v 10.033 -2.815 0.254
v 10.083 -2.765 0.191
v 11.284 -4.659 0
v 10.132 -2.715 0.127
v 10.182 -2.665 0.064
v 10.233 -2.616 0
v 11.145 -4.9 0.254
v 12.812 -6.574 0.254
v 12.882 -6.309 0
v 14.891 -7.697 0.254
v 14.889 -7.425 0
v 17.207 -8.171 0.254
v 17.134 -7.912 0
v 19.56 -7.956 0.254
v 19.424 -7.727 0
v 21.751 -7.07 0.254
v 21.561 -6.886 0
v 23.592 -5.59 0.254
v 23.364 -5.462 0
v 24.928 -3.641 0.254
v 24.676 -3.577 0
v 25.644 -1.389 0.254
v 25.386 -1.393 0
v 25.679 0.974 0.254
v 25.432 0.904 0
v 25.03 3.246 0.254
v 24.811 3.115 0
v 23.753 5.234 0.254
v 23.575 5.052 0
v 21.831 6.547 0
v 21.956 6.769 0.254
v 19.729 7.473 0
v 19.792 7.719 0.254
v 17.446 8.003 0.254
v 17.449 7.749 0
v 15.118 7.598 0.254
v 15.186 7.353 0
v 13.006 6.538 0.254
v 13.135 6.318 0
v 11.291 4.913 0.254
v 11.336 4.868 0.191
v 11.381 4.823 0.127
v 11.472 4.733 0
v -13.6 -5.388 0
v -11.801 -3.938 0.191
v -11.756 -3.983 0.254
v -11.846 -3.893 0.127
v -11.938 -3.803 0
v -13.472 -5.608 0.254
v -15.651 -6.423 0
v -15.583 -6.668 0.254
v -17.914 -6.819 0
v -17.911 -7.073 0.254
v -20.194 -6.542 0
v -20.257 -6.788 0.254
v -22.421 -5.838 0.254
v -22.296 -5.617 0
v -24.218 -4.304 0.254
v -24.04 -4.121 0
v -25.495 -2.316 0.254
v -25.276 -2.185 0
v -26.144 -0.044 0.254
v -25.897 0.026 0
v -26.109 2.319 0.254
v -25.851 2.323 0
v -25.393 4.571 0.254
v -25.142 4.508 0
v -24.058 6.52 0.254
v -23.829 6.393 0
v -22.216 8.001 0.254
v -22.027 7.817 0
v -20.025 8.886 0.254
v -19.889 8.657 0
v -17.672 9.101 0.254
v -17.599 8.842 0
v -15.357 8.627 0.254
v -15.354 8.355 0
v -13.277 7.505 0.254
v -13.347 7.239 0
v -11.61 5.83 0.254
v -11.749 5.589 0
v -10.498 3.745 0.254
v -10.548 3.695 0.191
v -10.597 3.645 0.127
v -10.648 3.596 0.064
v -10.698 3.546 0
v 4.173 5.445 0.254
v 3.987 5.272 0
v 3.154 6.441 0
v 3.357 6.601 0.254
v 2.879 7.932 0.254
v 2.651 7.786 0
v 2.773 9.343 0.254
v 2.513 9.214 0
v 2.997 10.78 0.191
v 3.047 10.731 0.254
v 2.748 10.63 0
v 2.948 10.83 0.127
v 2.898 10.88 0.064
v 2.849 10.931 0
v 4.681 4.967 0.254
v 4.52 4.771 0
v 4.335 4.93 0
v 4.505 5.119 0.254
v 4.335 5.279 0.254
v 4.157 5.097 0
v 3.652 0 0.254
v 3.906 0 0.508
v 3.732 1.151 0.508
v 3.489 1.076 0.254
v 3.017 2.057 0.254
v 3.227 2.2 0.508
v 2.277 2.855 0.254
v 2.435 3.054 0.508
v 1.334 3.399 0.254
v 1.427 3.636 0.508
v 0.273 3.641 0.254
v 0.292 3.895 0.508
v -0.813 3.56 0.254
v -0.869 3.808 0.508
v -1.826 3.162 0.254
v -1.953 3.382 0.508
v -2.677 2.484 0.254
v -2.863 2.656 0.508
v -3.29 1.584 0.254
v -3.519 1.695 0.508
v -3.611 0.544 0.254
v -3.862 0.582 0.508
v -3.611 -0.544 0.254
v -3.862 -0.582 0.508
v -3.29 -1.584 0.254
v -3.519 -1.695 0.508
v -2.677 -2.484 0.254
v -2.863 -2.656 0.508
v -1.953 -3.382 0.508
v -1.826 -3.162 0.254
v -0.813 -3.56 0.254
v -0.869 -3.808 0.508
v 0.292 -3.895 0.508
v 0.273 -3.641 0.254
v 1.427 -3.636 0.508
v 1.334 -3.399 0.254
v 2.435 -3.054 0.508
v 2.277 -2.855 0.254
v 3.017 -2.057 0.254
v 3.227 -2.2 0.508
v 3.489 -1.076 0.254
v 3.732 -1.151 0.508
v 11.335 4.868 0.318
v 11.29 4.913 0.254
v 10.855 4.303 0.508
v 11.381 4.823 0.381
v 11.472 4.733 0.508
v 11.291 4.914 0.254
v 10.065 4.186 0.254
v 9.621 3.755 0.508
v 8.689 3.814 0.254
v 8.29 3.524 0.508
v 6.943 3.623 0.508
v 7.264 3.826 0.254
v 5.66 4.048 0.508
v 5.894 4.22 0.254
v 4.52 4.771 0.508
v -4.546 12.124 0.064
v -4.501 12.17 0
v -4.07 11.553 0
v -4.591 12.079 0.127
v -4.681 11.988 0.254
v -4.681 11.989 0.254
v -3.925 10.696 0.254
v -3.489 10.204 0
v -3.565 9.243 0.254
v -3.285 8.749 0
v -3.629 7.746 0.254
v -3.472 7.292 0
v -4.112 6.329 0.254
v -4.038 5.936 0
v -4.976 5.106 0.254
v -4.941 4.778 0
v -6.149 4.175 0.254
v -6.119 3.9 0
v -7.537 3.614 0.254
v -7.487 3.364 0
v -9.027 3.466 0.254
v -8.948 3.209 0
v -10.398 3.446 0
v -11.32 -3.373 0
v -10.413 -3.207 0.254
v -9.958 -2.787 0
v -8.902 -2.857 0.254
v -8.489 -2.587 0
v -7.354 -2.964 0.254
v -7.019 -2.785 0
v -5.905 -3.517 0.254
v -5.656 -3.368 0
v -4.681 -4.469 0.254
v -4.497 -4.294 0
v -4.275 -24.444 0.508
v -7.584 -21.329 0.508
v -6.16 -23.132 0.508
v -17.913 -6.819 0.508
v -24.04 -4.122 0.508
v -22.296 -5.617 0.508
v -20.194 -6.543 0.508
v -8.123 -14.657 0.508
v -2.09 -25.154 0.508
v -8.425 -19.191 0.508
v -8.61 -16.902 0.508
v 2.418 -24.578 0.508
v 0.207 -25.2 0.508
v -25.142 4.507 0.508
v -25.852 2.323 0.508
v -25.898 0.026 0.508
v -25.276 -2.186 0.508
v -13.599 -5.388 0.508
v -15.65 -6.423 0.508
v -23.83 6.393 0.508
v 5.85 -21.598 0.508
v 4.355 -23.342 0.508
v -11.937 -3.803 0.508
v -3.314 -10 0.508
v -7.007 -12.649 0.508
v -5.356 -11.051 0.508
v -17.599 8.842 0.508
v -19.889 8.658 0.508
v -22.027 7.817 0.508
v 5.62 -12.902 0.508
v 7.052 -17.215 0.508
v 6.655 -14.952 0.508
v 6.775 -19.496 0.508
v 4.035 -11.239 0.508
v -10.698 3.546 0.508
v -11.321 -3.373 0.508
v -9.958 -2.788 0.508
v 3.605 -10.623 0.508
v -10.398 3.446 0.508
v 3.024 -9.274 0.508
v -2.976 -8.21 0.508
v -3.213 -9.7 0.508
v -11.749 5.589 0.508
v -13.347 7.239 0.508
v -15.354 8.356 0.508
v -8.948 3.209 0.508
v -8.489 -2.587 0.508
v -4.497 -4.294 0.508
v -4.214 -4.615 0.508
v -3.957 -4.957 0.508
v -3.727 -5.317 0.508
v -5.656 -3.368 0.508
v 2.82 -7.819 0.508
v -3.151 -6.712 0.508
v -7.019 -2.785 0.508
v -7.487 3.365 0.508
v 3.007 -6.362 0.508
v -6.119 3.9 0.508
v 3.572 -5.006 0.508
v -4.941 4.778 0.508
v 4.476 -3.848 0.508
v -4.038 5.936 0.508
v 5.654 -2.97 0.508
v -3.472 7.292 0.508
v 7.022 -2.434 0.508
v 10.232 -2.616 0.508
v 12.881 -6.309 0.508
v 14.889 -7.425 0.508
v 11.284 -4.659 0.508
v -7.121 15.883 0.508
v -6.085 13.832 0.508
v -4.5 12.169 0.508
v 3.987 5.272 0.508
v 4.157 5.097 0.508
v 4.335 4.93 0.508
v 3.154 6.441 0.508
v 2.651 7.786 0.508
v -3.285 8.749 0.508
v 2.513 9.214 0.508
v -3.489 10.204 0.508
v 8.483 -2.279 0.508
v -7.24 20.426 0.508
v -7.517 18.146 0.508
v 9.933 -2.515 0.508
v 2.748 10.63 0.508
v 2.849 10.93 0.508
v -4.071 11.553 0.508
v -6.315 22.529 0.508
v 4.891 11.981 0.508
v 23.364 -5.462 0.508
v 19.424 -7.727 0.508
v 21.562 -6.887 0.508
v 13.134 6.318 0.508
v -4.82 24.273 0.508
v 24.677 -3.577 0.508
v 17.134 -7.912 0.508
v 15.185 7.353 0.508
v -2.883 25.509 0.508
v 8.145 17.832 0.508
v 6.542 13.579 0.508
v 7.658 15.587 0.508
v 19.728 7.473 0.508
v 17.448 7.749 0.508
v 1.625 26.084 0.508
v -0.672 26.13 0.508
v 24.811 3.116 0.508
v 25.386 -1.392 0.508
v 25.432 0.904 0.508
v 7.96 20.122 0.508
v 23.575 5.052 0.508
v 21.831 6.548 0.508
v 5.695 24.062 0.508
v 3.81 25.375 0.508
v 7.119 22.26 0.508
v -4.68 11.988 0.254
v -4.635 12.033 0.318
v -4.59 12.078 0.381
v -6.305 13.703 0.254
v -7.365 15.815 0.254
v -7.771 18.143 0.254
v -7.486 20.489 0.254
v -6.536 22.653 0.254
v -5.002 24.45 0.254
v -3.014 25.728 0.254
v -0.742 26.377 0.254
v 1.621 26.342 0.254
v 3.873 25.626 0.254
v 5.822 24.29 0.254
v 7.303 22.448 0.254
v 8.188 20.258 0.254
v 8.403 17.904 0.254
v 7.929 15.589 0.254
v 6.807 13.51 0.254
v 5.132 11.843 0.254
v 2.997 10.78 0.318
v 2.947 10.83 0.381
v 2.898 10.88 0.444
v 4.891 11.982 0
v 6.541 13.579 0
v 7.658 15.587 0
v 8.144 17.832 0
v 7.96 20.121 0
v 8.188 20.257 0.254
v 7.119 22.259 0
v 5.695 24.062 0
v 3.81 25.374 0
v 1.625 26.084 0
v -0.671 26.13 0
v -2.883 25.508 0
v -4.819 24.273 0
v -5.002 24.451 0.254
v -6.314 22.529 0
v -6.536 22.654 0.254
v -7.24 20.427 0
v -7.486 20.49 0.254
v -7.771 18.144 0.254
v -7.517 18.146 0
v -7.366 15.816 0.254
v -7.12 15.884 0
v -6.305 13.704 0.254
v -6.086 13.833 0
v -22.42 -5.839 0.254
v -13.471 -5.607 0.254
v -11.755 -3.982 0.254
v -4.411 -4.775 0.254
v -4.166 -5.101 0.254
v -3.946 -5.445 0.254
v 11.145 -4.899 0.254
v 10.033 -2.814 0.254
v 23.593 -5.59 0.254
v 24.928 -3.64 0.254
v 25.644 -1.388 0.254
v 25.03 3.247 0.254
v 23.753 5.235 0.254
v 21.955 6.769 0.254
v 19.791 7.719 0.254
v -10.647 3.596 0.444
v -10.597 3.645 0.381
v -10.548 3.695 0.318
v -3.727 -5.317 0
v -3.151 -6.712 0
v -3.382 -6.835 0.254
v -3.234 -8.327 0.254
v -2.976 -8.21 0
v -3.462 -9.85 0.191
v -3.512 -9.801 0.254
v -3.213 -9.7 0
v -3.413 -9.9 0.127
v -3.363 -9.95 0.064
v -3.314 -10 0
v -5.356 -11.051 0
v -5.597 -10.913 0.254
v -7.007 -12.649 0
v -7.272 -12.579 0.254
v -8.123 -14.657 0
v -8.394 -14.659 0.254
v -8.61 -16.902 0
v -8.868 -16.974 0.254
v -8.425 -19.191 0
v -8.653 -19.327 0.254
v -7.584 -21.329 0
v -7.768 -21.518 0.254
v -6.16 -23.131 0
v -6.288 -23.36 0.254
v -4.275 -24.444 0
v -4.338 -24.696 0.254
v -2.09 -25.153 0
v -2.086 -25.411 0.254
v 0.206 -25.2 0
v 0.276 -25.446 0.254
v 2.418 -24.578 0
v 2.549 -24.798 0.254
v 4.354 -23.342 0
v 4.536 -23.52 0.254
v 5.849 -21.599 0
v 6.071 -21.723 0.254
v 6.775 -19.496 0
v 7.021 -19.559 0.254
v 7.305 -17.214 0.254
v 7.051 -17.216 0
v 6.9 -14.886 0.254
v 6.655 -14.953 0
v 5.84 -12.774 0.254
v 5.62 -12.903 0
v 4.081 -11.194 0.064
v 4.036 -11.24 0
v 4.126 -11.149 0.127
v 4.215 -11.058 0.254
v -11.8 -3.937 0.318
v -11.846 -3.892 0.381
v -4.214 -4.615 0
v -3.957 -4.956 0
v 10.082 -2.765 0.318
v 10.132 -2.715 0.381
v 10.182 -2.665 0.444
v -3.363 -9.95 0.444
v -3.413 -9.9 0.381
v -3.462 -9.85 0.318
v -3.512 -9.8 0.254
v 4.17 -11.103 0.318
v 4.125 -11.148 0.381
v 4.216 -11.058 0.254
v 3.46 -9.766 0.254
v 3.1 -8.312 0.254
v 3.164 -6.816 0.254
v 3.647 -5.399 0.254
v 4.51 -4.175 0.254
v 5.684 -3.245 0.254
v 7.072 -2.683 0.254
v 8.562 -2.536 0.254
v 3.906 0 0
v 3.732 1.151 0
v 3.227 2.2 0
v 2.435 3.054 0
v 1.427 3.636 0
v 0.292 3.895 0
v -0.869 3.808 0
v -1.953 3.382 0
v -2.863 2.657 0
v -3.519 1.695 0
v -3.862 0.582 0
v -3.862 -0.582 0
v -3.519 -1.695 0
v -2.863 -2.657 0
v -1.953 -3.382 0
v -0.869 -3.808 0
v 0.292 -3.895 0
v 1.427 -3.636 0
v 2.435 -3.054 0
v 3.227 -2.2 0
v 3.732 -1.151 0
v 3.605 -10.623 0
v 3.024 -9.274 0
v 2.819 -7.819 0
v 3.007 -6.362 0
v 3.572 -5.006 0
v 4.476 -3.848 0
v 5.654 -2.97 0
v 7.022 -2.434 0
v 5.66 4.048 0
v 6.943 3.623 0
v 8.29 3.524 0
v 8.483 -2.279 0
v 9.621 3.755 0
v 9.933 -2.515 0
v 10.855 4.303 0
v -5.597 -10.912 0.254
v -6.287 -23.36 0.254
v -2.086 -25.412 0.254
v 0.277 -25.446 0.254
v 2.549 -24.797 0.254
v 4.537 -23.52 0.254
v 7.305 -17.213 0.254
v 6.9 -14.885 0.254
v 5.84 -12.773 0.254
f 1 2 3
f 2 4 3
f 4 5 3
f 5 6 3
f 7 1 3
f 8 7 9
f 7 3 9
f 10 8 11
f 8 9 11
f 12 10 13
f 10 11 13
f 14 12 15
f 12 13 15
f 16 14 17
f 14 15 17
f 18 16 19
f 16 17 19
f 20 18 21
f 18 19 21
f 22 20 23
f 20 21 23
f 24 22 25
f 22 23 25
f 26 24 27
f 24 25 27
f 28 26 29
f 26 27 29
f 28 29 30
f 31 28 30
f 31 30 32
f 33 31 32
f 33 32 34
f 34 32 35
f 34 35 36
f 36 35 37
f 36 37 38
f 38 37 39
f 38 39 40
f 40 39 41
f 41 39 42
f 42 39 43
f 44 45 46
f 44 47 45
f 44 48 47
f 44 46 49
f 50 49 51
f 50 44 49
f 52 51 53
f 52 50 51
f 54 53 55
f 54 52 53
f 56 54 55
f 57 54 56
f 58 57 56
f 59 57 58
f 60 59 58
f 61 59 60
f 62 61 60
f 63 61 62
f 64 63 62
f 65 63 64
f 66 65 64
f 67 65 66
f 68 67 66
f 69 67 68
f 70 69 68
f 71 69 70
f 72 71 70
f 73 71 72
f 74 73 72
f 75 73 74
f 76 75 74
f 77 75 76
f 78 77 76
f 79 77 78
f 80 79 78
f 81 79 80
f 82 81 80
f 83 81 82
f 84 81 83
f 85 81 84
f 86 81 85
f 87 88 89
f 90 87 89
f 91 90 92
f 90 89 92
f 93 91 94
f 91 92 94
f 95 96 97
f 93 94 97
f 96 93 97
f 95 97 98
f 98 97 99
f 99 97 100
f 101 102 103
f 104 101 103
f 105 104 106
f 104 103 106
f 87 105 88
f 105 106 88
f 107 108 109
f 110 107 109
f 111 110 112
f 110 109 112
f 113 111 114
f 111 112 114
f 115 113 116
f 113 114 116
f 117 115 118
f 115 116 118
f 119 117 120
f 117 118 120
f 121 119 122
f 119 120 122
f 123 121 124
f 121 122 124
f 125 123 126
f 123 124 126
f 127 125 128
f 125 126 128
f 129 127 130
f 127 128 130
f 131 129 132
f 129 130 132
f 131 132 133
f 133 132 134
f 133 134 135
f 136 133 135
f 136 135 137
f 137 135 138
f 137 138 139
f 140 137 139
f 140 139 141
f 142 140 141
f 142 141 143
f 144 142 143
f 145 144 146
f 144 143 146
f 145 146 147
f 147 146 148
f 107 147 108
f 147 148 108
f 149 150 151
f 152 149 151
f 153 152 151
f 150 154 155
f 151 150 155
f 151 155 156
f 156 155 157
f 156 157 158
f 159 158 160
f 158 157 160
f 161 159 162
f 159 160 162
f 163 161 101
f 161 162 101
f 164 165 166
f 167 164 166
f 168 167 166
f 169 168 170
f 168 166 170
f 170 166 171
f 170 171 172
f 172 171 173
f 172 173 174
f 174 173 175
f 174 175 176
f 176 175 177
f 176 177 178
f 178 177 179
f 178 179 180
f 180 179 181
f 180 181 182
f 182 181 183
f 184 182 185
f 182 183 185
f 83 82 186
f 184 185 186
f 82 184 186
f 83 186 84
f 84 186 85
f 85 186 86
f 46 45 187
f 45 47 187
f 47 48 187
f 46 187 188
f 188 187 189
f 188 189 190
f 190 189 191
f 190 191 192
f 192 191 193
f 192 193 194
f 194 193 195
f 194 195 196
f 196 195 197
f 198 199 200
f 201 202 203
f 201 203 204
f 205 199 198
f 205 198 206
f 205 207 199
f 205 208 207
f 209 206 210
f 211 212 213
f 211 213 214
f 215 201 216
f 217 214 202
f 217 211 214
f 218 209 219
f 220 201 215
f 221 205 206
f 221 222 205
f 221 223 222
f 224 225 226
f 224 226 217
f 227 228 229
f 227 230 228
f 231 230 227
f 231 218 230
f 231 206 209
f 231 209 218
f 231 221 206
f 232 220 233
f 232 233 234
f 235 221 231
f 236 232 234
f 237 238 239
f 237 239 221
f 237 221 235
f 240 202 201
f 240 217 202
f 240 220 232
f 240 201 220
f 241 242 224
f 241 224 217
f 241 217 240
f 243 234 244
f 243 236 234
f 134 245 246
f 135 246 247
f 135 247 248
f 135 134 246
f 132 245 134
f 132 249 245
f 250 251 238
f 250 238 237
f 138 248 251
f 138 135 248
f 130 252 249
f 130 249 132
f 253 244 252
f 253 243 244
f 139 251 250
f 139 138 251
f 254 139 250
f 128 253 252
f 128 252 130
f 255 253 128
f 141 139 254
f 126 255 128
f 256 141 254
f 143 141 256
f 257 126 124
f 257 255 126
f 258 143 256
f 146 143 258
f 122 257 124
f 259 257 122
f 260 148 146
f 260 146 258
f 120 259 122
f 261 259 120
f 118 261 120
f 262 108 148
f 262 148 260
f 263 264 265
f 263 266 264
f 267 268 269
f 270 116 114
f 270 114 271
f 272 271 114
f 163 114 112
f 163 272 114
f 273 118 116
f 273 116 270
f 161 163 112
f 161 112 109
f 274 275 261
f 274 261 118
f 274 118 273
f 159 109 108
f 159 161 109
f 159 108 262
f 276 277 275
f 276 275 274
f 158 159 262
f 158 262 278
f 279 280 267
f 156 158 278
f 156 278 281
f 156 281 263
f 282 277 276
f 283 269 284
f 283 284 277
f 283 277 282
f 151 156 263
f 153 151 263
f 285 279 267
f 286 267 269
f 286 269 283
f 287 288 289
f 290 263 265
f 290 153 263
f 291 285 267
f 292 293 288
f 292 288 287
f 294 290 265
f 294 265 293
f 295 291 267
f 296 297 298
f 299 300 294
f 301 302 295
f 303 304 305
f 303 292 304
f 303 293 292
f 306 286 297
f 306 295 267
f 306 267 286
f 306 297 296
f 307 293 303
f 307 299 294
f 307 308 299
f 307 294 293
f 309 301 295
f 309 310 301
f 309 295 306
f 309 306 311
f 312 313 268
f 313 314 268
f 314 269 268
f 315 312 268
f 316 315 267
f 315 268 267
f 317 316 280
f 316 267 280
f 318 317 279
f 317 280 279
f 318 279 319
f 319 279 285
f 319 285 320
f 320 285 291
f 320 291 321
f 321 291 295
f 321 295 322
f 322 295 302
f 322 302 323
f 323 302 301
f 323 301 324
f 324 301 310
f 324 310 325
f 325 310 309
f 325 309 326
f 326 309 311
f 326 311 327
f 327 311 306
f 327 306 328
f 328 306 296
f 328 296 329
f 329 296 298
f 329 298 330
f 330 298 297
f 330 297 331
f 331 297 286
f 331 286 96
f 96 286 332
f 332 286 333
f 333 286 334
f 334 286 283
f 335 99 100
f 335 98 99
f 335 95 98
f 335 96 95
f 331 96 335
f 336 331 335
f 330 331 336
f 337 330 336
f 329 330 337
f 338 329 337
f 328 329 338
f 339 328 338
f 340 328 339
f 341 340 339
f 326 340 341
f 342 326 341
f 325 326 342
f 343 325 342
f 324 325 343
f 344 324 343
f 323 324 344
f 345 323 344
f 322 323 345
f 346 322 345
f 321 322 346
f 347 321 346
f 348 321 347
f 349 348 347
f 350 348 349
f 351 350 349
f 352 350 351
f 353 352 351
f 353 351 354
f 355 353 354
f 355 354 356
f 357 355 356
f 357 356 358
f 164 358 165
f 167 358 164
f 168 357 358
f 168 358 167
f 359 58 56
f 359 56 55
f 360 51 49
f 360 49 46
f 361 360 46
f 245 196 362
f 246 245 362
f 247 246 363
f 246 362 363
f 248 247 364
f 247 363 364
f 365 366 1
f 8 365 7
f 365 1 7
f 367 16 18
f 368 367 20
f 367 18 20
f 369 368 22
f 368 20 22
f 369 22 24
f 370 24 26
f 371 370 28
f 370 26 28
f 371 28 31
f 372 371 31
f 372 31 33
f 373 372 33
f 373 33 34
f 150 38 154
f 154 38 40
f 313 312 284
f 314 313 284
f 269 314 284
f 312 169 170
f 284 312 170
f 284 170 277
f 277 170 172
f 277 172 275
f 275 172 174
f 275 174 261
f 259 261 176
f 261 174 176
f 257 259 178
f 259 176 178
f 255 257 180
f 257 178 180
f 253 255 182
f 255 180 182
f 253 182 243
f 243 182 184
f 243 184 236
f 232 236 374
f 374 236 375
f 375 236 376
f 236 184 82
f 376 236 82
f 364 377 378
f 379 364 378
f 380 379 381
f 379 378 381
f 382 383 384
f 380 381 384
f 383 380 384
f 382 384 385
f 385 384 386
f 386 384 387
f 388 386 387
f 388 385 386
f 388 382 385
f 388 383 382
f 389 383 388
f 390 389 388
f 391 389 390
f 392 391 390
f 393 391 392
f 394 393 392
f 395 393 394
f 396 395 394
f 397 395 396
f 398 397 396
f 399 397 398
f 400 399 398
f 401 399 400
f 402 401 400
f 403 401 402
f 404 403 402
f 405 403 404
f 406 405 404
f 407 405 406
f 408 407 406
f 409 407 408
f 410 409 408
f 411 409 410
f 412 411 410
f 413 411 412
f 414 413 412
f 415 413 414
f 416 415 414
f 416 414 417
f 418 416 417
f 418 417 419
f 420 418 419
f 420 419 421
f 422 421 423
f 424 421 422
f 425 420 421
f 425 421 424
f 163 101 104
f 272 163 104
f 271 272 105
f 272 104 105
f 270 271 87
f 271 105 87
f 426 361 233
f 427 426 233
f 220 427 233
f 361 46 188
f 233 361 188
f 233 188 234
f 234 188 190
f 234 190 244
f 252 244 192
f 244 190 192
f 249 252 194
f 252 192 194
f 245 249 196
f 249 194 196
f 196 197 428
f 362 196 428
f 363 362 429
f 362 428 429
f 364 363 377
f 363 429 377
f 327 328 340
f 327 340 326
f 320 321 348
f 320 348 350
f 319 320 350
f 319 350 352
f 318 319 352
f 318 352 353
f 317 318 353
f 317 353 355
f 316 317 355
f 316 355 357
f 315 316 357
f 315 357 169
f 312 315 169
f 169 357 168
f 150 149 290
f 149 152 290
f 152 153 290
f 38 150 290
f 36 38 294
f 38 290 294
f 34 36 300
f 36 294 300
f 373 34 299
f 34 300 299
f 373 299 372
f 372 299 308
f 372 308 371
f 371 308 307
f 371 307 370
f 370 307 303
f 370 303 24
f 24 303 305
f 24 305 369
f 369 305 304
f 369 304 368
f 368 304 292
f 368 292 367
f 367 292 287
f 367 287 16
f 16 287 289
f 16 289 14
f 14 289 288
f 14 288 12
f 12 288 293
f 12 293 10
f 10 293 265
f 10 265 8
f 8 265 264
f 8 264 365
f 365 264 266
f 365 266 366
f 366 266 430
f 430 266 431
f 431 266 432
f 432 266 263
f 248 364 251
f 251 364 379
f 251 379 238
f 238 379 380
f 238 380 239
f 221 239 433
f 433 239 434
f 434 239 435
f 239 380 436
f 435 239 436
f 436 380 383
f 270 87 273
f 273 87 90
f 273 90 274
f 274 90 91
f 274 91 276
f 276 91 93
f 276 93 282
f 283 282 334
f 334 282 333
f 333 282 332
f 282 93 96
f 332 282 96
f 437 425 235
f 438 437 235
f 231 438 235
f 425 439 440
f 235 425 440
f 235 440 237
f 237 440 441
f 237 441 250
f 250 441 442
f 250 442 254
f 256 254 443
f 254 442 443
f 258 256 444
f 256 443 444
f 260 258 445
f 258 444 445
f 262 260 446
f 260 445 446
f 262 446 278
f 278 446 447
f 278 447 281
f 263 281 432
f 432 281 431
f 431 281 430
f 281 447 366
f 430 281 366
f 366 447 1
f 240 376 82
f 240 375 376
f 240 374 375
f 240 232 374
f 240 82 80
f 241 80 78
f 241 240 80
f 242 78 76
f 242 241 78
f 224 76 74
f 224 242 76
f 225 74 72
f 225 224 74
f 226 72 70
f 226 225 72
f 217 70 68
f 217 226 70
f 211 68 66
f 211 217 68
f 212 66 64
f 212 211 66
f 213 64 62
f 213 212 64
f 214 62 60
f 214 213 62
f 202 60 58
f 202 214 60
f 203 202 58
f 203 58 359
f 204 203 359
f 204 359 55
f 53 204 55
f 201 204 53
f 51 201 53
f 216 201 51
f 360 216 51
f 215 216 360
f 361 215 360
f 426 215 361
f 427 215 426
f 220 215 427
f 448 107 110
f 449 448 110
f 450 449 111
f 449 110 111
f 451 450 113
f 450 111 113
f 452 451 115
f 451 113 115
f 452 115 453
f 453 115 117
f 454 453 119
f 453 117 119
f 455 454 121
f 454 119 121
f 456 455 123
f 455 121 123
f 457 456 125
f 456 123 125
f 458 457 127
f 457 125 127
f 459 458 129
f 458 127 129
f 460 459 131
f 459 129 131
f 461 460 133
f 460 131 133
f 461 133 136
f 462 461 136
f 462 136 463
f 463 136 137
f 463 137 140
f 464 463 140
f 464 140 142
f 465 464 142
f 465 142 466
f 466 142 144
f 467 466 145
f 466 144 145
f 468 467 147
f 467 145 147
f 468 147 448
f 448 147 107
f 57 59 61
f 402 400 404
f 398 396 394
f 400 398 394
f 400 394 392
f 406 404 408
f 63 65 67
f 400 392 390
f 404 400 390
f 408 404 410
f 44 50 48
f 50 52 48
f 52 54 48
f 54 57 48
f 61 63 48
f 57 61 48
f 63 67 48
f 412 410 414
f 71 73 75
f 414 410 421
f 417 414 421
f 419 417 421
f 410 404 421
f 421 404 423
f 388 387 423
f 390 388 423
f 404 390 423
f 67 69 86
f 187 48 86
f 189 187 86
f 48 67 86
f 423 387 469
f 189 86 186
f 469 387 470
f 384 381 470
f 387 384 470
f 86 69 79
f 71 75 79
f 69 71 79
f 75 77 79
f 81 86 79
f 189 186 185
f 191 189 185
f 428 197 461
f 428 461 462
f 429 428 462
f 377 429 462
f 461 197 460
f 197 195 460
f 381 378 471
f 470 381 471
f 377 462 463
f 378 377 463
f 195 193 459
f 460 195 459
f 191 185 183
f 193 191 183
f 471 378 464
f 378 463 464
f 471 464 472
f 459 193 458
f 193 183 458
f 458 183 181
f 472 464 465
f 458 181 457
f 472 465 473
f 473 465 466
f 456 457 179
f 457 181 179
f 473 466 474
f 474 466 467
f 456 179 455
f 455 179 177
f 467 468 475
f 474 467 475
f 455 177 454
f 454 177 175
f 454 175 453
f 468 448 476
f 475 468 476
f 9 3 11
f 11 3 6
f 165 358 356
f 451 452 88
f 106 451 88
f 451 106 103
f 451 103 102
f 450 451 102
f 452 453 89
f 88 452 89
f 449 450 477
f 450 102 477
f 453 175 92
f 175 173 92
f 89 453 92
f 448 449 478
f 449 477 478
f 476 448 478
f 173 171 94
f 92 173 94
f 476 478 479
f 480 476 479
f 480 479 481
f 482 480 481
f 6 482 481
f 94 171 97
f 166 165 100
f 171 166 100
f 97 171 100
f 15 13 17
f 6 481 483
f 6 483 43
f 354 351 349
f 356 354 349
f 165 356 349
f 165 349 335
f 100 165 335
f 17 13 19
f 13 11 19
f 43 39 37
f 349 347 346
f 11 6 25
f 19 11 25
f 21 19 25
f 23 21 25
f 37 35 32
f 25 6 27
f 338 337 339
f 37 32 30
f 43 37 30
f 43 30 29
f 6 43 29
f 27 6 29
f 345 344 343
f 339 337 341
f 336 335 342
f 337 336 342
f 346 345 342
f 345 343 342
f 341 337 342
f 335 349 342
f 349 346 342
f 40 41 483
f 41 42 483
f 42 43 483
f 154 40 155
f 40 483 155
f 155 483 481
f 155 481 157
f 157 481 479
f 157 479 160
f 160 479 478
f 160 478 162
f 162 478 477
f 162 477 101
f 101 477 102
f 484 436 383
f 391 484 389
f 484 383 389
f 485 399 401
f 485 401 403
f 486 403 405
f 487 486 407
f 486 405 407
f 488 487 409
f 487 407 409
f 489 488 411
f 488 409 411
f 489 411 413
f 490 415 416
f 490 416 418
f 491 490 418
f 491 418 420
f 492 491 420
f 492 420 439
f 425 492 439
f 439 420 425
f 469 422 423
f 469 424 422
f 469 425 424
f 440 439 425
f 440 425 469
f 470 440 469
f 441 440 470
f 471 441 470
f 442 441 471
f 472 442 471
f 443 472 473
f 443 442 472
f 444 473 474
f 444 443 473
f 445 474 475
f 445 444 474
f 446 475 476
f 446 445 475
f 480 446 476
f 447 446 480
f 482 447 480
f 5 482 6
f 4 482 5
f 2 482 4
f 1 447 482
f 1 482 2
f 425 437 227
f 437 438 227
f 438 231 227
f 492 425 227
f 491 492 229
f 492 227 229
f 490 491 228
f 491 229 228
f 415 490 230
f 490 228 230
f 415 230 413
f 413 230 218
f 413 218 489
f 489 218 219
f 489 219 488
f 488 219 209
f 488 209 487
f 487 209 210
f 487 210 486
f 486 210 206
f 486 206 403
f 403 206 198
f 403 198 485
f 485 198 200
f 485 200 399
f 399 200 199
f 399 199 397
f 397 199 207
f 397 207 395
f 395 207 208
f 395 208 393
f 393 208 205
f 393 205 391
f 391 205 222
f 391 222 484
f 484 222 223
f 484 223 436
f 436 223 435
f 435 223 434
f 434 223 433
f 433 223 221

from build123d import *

# Parameters (mm, degrees)
F0_R        = 3.6516934022
F1_DEPTH    = 0.508
F2_C1_SIZE  = 0.254
F2_C2_SIZE  = 0.2539
F2_C3_SIZE  = 0.254
F2_C4_SIZE  = 0.2539
F2_C5_SIZE  = 0.254
F2_C6_SIZE  = 0.2539
F2_C7_SIZE  = 0.254
F2_C8_SIZE  = 0.2539
F2_C9_SIZE  = 0.2539
F2_C10_SIZE = 0.2536
F2_C11_SIZE = 0.254
F2_C12_SIZE = 0.2539
F2_C13_SIZE = 0.2539
F2_C14_SIZE = 0.2536
F2_C15_SIZE = 0.2539
F2_C16_SIZE = 0.2536
F2_C17_SIZE = 0.2539
F2_C18_SIZE = 0.2536


# Not quite as in the source:
# - a fillet or chamfer is up to 0.001 mm smaller than in the source, because OpenCascade refuses the exact size


with BuildPart() as f1:
    # F0 (on Top) → F1 (new body)
    with BuildSketch(Plane.XY):
        with BuildLine():
            ThreePointArc((-4.6809479161, -4.4692134998), (-4.2851428425, -4.9358337251), (-3.9462508024, -5.445292532))
            ThreePointArc((-3.9462508024, -5.445292532), (-3.2543970352, -7.5756381968), (-3.5123975908, -9.8006033651))
            ThreePointArc((-3.5123975908, -9.8006033651), (0.5657181683, -9.1143610896), (4.2157772611, -11.0583325976))
            ThreePointArc((4.2157772611, -11.0583325976), (4.0349146255, -4.7562355253), (10.0331924761, -2.8146378249))
            ThreePointArc((10.0331924761, -2.8146378249), (9.3469502005, 1.2634779342), (11.2909217086, 4.913537027))
            ThreePointArc((11.2909217086, 4.913537027), (7.9764094343, 3.7712610201), (4.6809479161, 4.9673878837))
            ThreePointArc((4.6809479161, 4.9673878837), (4.4188770442, 5.1978976137), (4.1726827472, 5.445292532))
            ThreePointArc((4.1726827472, 5.445292532), (2.8785820733, 7.9323939108), (3.0472269358, 10.730952242))
            ThreePointArc((3.0472269358, 10.730952242), (-1.0308888232, 10.0447099664), (-4.6809479161, 11.9886814745))
            ThreePointArc((-4.6809479161, 11.9886814745), (-4.5000852805, 5.6865844021), (-10.498363131, 3.7449867017))
            ThreePointArc((-10.498363131, 3.7449867017), (-9.8121208555, -0.3331290573), (-11.7560923635, -3.9831881502))
            ThreePointArc((-11.7560923635, -3.9831881502), (-8.1241949781, -2.8530951946), (-4.6809479161, -4.4692134998))
        make_face()
        Circle(F0_R, mode=Mode.SUBTRACT)
        with BuildLine():
            ThreePointArc((-10.498363131, 3.7449867017), (-26.1092040598, 2.319155388), (-11.7560923635, -3.9831881502))
            ThreePointArc((-11.7560923635, -3.9831881502), (-9.8121208555, -0.3331290573), (-10.498363131, 3.7449867017))
        make_face()
        with BuildLine():
            ThreePointArc((4.2157772611, -11.0583325976), (0.5657181683, -9.1143610896), (-3.5123975908, -9.8006033651))
            ThreePointArc((-3.5123975908, -9.8006033651), (-2.0865662771, -25.4114442939), (4.2157772611, -11.0583325976))
        make_face()
        with BuildLine():
            ThreePointArc((11.2909217086, 4.913537027), (9.3469502005, 1.2634779342), (10.0331924761, -2.8146378249))
            ThreePointArc((10.0331924761, -2.8146378249), (25.6440334048, -1.3888065112), (11.2909217086, 4.913537027))
        make_face()
        with BuildLine():
            ThreePointArc((3.0472269358, 10.730952242), (1.6213956221, 26.3417931707), (-4.6809479161, 11.9886814745))
            ThreePointArc((-4.6809479161, 11.9886814745), (-1.0308888232, 10.0447099664), (3.0472269358, 10.730952242))
        make_face()
    extrude(amount=F1_DEPTH)

    # F2: chamfer of 0.254 on 18 edges, made by hand

    # F2_c1
    f2_c1_edges = [f1.edges().sort_by_distance(p)[0] for p in [
        (-5.4539952912, -3.8023255146, 0),
    ]]
    chamfer(f2_c1_edges, length=F2_C1_SIZE)

    # F2_c2 (size 0.254 in the source; OpenCascade refuses exactly that, so slightly less here)
    f2_c2_edges = [f1.edges().sort_by_distance(p)[0] for p in [
        (-5.4539952912, -3.8023255146, 0.508),
    ]]
    chamfer(f2_c2_edges, length=F2_C2_SIZE)

    # F2_c3
    f2_c3_edges = [f1.edges().sort_by_distance(p)[0] for p in [
        (4.0349146255, -4.7562355253, 0),
    ]]
    chamfer(f2_c3_edges, length=F2_C3_SIZE)

    # F2_c4 (size 0.254 in the source; OpenCascade refuses exactly that, so slightly less here)
    f2_c4_edges = [f1.edges().sort_by_distance(p)[0] for p in [
        (4.0349146255, -4.7562355253, 0.508),
    ]]
    chamfer(f2_c4_edges, length=F2_C4_SIZE)

    # F2_c5
    f2_c5_edges = [f1.edges().sort_by_distance(p)[0] for p in [
        (4.9888246362, 4.7326743914, 0),
    ]]
    chamfer(f2_c5_edges, length=F2_C5_SIZE)

    # F2_c6 (size 0.254 in the source; OpenCascade refuses exactly that, so slightly less here)
    f2_c6_edges = [f1.edges().sort_by_distance(p)[0] for p in [
        (4.9888246362, 4.7326743914, 0.508),
    ]]
    chamfer(f2_c6_edges, length=F2_C6_SIZE)

    # F2_c7
    f2_c7_edges = [f1.edges().sort_by_distance(p)[0] for p in [
        (-4.5000852805, 5.6865844021, 0),
    ]]
    chamfer(f2_c7_edges, length=F2_C7_SIZE)

    # F2_c8 (size 0.254 in the source; OpenCascade refuses exactly that, so slightly less here)
    f2_c8_edges = [f1.edges().sort_by_distance(p)[0] for p in [
        (-4.5000852805, 5.6865844021, 0.508),
    ]]
    chamfer(f2_c8_edges, length=F2_C8_SIZE)

    # F2_c9 (size 0.254 in the source; OpenCascade refuses exactly that, so slightly less here)
    f2_c9_edges = [f1.edges().sort_by_distance(p)[0] for p in [
        (-26.1092040598, 2.319155388, 0),
    ]]
    chamfer(f2_c9_edges, length=F2_C9_SIZE)

    # F2_c10 (size 0.254 in the source; OpenCascade refuses exactly that, so slightly less here)
    f2_c10_edges = [f1.edges().sort_by_distance(p)[0] for p in [
        (-26.1092040598, 2.319155388, 0.508),
    ]]
    chamfer(f2_c10_edges, length=F2_C10_SIZE)

    # F2_c11
    f2_c11_edges = [f1.edges().sort_by_distance(p)[0] for p in [
        (-3.6516934022, 0, 0),
    ]]
    chamfer(f2_c11_edges, length=F2_C11_SIZE)

    # F2_c12 (size 0.254 in the source; OpenCascade refuses exactly that, so slightly less here)
    f2_c12_edges = [f1.edges().sort_by_distance(p)[0] for p in [
        (-3.6516934022, 0, 0.508),
    ]]
    chamfer(f2_c12_edges, length=F2_C12_SIZE)

    # F2_c13 (size 0.254 in the source; OpenCascade refuses exactly that, so slightly less here)
    f2_c13_edges = [f1.edges().sort_by_distance(p)[0] for p in [
        (-2.0865662771, -25.4114442939, 0),
    ]]
    chamfer(f2_c13_edges, length=F2_C13_SIZE)

    # F2_c14 (size 0.254 in the source; OpenCascade refuses exactly that, so slightly less here)
    f2_c14_edges = [f1.edges().sort_by_distance(p)[0] for p in [
        (-2.0865662771, -25.4114442939, 0.508),
    ]]
    chamfer(f2_c14_edges, length=F2_C14_SIZE)

    # F2_c15 (size 0.254 in the source; OpenCascade refuses exactly that, so slightly less here)
    f2_c15_edges = [f1.edges().sort_by_distance(p)[0] for p in [
        (25.6440334048, -1.3888065112, 0),
    ]]
    chamfer(f2_c15_edges, length=F2_C15_SIZE)

    # F2_c16 (size 0.254 in the source; OpenCascade refuses exactly that, so slightly less here)
    f2_c16_edges = [f1.edges().sort_by_distance(p)[0] for p in [
        (25.6440334048, -1.3888065112, 0.508),
    ]]
    chamfer(f2_c16_edges, length=F2_C16_SIZE)

    # F2_c17 (size 0.254 in the source; OpenCascade refuses exactly that, so slightly less here)
    f2_c17_edges = [f1.edges().sort_by_distance(p)[0] for p in [
        (1.6213956221, 26.3417931707, 0),
    ]]
    chamfer(f2_c17_edges, length=F2_C17_SIZE)

    # F2_c18 (size 0.254 in the source; OpenCascade refuses exactly that, so slightly less here)
    f2_c18_edges = [f1.edges().sort_by_distance(p)[0] for p in [
        (1.6213956221, 26.3417931707, 0.508),
    ]]
    chamfer(f2_c18_edges, length=F2_C18_SIZE)


solid = f1.part
